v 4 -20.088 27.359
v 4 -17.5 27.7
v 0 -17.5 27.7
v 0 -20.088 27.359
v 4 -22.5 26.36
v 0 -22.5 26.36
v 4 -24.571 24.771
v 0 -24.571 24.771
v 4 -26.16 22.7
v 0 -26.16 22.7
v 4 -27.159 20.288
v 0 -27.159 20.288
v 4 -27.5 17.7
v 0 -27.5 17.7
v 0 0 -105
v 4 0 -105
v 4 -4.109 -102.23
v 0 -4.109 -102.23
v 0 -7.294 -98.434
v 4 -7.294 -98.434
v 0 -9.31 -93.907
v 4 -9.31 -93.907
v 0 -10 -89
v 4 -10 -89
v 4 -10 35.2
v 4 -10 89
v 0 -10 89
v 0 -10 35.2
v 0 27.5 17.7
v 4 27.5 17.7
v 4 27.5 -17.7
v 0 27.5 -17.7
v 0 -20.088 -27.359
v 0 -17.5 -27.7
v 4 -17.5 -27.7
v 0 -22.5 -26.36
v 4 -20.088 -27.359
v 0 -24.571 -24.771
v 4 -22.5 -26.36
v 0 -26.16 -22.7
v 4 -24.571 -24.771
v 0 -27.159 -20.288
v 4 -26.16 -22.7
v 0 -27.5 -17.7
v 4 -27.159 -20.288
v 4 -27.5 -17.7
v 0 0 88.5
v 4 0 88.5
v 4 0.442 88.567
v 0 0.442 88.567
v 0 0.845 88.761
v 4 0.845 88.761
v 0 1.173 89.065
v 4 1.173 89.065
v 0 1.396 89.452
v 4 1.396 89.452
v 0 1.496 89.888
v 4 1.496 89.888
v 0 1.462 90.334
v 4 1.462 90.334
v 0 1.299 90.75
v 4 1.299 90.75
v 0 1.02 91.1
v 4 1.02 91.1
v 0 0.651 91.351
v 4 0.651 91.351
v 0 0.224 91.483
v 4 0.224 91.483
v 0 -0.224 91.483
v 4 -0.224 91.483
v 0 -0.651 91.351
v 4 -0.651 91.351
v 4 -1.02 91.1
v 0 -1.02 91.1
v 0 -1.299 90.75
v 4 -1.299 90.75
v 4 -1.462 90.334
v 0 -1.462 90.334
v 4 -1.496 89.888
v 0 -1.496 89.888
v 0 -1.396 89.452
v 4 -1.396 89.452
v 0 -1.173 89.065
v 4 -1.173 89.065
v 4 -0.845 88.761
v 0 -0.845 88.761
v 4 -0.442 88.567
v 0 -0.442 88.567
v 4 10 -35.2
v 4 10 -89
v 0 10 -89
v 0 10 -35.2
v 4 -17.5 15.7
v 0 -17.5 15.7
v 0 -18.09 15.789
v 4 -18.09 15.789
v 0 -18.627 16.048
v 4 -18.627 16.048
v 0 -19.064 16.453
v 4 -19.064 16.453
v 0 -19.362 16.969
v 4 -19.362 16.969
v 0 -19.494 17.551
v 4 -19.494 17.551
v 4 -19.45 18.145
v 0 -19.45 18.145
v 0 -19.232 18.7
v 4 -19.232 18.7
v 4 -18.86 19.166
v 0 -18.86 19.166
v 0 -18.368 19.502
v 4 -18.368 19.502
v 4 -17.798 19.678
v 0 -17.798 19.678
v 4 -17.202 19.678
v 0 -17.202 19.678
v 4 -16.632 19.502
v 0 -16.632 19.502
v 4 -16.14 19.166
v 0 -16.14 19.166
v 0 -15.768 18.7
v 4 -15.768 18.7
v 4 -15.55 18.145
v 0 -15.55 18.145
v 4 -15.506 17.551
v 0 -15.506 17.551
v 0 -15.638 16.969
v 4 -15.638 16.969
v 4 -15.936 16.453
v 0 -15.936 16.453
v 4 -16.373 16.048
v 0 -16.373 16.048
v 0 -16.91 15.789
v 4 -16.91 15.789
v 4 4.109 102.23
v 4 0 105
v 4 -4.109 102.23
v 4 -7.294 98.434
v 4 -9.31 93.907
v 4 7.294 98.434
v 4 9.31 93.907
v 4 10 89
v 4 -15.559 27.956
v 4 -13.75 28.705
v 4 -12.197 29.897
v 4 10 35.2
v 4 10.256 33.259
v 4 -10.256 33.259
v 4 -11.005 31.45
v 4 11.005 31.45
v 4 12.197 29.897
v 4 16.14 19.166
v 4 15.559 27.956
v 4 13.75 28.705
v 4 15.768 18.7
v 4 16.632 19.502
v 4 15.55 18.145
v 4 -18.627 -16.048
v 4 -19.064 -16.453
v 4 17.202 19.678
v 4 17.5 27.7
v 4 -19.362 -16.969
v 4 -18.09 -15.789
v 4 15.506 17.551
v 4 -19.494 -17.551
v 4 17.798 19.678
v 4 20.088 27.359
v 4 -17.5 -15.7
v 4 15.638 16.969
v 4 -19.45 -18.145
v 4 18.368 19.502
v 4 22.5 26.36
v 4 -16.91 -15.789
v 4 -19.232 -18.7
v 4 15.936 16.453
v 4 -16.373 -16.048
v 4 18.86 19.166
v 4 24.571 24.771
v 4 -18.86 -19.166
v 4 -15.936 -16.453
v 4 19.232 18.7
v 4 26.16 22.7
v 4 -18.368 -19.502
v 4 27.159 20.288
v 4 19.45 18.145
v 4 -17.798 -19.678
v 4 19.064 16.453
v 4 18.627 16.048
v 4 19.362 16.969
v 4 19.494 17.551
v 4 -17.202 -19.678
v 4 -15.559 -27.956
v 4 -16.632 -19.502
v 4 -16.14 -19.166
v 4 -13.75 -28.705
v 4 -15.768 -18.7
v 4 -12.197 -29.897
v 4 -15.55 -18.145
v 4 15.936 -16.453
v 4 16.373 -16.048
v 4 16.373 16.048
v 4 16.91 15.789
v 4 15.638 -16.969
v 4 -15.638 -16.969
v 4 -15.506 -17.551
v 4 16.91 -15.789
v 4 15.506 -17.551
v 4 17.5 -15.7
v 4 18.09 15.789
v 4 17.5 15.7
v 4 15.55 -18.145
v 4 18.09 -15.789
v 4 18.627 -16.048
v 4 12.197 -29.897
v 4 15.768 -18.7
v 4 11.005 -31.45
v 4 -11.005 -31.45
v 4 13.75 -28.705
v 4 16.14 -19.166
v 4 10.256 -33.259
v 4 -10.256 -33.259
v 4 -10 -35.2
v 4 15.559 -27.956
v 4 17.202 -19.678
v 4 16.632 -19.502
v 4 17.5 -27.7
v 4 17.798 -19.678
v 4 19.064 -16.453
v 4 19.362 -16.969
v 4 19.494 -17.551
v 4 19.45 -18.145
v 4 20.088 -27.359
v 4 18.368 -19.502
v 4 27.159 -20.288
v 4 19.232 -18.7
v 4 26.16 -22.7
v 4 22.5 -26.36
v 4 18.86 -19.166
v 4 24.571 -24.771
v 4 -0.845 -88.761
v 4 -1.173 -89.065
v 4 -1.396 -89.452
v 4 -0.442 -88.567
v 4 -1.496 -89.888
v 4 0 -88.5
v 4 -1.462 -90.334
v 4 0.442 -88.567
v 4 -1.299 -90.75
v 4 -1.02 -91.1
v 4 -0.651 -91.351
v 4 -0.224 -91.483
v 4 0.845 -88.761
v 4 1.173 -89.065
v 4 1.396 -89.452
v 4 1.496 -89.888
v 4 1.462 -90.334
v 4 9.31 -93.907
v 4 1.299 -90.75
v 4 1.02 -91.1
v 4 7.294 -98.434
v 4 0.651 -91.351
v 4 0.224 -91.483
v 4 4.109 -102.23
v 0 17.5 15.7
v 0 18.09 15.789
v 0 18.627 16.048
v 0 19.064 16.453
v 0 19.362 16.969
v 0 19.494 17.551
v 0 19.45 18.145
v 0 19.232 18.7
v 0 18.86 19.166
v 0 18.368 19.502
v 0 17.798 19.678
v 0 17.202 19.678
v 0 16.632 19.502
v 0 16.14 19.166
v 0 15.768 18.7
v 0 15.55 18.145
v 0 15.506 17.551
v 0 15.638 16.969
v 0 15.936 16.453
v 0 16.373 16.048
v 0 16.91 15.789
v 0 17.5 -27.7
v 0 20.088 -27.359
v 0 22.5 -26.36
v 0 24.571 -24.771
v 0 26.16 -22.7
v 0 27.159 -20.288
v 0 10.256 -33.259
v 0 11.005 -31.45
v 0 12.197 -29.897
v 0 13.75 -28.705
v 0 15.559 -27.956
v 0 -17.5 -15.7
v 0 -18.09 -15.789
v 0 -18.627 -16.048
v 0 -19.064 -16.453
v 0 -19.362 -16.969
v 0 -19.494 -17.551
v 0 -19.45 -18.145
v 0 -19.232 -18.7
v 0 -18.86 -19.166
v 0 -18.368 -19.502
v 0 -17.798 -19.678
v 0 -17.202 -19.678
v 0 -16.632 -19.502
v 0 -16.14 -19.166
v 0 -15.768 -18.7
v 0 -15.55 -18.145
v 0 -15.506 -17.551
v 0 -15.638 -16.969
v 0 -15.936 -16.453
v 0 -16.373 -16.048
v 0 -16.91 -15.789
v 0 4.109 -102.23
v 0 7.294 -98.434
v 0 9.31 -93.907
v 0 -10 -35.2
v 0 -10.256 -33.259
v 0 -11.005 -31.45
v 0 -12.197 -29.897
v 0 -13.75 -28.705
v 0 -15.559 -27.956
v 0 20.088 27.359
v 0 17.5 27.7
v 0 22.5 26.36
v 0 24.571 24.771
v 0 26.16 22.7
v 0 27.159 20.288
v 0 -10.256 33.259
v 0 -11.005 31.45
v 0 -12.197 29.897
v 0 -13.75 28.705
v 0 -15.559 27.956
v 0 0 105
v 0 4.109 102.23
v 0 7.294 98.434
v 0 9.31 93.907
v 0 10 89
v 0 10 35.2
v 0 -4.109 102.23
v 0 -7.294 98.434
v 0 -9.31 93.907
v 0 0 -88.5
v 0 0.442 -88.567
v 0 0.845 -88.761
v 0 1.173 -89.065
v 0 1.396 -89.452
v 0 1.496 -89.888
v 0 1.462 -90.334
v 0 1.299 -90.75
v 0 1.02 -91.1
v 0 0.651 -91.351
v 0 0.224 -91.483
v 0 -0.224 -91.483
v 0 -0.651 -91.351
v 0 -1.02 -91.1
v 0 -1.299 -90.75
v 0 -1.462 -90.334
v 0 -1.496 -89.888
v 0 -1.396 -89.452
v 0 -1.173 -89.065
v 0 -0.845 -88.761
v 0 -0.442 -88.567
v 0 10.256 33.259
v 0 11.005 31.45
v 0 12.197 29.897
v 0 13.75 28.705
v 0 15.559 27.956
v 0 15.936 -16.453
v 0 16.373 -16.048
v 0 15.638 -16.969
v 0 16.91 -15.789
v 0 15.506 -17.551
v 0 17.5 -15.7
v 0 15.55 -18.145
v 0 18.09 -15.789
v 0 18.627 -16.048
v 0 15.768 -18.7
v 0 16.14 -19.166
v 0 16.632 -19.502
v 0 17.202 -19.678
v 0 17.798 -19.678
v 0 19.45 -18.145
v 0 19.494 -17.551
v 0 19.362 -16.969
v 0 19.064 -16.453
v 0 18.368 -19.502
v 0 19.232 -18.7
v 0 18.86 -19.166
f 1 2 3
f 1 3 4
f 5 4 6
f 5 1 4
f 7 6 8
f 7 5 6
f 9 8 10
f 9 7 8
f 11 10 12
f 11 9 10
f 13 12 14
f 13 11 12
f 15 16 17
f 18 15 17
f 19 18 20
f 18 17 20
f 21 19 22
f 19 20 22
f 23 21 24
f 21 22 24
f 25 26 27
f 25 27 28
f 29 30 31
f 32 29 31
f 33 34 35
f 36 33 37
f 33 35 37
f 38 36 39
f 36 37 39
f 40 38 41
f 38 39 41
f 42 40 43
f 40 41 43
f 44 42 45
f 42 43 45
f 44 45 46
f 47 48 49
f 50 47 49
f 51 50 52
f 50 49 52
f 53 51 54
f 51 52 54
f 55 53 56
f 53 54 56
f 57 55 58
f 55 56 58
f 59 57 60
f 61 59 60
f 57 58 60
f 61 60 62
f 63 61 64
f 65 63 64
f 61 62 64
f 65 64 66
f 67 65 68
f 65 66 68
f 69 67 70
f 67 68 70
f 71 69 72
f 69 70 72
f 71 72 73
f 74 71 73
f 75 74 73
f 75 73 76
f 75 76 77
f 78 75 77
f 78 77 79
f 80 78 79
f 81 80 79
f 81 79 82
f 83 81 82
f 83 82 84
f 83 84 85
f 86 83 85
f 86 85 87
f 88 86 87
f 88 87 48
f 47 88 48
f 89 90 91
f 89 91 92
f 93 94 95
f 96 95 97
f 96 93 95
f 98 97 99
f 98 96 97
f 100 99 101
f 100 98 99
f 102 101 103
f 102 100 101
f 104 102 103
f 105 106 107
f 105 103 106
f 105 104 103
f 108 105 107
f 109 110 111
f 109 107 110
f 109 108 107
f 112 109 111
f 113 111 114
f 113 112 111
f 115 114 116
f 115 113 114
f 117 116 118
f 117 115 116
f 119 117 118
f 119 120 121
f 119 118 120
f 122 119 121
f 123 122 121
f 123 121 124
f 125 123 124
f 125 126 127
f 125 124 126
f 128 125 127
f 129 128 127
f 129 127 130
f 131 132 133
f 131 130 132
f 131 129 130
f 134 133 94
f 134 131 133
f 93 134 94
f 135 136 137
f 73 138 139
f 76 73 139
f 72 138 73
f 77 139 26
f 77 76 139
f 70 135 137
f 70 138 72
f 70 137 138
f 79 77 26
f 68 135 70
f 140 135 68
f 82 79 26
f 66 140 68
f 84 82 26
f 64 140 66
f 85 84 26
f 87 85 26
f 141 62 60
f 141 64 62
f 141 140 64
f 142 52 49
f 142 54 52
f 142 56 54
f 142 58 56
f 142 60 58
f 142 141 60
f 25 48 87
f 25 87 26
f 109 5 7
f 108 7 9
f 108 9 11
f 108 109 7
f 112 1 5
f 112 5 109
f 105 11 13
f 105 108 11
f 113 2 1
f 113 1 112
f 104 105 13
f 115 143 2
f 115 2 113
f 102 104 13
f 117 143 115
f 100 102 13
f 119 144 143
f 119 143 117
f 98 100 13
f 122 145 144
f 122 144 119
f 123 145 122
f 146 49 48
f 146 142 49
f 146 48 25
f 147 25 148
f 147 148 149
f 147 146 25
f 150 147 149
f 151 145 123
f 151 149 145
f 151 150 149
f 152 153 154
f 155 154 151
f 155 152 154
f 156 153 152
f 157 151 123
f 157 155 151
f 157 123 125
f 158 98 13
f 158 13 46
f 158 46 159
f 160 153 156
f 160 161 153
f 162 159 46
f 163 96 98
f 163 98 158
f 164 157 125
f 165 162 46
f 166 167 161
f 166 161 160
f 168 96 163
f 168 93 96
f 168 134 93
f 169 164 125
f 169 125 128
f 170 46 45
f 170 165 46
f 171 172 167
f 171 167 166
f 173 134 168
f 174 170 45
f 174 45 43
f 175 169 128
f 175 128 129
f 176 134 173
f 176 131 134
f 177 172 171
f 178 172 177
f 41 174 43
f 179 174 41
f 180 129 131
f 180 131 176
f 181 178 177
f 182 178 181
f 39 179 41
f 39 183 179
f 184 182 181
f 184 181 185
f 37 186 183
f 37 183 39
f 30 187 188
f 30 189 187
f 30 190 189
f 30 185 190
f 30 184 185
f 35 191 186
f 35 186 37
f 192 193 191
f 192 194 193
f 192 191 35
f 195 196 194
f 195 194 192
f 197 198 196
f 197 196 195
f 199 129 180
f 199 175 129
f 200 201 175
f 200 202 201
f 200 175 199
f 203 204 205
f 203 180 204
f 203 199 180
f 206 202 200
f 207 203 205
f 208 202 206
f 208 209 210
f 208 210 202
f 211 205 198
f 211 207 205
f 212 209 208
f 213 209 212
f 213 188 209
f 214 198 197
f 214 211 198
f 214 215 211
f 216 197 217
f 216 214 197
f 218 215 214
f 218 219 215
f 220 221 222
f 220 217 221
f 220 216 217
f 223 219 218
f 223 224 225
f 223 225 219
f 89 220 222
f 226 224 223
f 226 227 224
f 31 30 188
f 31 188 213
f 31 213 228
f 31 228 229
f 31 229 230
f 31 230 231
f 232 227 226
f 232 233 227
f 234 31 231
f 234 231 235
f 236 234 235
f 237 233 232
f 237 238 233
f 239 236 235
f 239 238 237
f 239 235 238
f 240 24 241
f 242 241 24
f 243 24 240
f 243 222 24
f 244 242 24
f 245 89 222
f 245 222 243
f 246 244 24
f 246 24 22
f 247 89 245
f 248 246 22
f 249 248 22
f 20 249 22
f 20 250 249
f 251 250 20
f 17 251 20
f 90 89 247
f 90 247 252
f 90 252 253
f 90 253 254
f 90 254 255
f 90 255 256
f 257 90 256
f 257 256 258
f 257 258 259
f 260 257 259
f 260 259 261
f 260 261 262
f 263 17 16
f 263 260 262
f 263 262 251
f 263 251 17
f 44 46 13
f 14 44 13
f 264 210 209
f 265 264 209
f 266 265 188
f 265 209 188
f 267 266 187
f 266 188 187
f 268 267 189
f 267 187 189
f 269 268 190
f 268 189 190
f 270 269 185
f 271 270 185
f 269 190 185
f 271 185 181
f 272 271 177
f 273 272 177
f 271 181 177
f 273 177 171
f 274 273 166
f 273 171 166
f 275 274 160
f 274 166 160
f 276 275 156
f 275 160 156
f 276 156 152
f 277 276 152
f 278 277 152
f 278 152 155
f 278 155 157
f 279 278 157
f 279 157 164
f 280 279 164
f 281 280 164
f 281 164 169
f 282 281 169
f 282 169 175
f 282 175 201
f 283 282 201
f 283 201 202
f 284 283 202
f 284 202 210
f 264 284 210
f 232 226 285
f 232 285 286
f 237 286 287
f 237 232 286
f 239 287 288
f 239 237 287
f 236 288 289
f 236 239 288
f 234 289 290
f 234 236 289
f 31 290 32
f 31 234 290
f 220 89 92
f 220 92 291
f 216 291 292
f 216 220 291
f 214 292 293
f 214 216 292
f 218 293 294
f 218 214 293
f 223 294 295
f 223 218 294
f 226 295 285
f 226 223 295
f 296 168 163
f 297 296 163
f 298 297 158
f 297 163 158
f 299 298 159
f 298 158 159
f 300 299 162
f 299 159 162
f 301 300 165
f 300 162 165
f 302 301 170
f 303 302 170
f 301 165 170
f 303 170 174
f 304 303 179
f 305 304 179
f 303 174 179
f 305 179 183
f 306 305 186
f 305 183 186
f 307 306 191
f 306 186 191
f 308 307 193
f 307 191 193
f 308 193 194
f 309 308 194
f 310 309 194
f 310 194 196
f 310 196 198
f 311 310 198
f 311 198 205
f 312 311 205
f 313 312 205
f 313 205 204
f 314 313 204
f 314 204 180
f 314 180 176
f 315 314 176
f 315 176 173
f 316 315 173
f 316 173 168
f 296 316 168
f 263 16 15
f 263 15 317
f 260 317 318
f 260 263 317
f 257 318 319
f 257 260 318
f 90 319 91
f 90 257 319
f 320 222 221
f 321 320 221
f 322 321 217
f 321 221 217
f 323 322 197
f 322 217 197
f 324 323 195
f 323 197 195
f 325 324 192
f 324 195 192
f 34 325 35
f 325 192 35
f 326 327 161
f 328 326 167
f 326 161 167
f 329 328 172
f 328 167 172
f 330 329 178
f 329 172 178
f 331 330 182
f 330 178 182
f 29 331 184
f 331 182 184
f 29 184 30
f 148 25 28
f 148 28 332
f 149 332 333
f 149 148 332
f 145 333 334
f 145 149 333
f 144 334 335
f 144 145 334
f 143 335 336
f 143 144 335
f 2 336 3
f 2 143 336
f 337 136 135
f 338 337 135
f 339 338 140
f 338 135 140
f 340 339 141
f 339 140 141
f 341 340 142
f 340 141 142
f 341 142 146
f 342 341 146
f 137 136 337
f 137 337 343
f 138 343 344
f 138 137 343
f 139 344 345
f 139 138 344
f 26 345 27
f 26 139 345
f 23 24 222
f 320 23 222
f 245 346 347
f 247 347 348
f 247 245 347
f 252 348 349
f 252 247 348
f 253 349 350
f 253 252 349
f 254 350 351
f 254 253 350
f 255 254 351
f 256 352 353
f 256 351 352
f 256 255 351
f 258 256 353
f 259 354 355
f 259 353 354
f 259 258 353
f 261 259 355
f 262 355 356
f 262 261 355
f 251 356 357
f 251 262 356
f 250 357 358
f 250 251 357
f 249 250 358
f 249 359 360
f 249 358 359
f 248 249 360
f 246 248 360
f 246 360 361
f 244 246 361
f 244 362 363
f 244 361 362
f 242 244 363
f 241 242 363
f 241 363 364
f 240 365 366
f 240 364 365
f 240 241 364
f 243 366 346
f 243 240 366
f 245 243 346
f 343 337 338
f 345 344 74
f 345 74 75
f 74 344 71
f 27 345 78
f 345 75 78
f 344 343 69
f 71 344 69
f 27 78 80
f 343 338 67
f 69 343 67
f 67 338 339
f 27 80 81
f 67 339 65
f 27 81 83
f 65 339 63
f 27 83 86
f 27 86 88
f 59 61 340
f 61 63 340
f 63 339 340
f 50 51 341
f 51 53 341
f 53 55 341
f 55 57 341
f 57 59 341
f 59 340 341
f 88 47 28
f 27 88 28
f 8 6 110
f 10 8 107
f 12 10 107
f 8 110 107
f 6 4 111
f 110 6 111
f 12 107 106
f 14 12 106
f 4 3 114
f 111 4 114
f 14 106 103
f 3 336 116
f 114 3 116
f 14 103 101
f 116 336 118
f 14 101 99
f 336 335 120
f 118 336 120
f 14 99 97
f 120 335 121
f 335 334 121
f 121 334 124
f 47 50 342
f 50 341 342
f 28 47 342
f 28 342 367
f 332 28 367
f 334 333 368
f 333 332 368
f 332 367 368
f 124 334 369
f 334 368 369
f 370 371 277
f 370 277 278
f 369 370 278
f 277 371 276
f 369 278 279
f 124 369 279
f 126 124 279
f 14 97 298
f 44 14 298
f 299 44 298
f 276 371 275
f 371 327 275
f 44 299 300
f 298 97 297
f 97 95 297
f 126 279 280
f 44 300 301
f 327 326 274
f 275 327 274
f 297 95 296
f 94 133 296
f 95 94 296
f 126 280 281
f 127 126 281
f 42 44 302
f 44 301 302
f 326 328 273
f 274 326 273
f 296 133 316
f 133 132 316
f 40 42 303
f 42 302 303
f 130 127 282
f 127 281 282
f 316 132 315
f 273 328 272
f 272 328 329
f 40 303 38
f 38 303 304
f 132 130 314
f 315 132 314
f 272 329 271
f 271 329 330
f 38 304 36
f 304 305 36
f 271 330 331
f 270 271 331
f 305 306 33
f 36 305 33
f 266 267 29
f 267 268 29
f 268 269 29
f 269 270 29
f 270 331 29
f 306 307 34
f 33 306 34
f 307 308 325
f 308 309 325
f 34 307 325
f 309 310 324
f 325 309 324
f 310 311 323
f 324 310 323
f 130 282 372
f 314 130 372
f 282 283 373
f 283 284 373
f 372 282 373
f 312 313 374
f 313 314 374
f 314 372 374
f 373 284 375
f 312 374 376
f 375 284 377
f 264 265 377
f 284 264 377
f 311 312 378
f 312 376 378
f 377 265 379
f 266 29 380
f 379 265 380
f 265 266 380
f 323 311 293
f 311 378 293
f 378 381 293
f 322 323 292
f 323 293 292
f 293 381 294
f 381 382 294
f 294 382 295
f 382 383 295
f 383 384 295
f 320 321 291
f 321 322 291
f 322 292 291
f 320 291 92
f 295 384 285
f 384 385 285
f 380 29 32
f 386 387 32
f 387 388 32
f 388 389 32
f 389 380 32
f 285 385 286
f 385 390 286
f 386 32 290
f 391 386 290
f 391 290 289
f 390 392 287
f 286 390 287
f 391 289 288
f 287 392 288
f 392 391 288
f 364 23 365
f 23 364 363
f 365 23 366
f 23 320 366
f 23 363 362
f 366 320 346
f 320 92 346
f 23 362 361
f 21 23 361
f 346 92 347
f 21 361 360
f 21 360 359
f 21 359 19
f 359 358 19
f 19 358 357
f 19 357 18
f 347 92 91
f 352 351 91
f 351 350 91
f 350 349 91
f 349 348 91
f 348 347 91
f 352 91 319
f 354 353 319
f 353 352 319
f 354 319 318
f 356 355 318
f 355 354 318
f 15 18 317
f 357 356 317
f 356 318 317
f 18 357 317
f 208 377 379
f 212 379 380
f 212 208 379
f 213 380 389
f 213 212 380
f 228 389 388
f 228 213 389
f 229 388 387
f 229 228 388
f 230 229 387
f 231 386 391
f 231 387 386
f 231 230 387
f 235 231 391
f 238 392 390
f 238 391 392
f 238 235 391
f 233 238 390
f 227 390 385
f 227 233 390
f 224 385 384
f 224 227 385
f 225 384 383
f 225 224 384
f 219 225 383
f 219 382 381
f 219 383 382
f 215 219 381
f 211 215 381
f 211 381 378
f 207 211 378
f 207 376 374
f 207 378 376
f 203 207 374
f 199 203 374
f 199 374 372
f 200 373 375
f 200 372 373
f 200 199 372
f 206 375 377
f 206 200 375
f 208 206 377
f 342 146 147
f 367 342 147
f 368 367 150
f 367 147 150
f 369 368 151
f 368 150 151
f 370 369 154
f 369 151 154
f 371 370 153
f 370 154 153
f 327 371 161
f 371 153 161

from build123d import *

# Parameters (mm, degrees)
SKETCH1_W               = 210
SKETCH1_H               = 61.270358306
BOSS_EXTRUDE1_DEPTH     = 4
SKETCH2_R               = 1.5
CUT_EXTRUDE1_DEPTH      = 5
SKETCH3_R               = 2
CUT_EXTRUDE2_DEPTH      = 5
CUT_EXTRUDE3_DEPTH      = 5
MIRROR3_COPY_1_SKETCH_R = 2
MIRROR3_COPY_1_DEPTH    = 5
MIRROR3_COPY_2_DEPTH    = 5


with BuildPart() as part:
    # Sketch1 → Boss-Extrude1 (new body)
    with BuildSketch(Plane(origin=(0, 0, 0), x_dir=(0, 0, -1), z_dir=(1, 0, 0))):
        Rectangle(SKETCH1_W, SKETCH1_H)
    extrude(amount=BOSS_EXTRUDE1_DEPTH)

    # Sketch2 → Cut-Extrude1 (cut, through all)
    with BuildSketch(Plane(origin=(4, 0, 0), x_dir=(0, 0, -1), z_dir=(1, 0, 0))):
        with Locations((-90, 0)):
            Circle(SKETCH2_R)
    cut_extrude1 = extrude(amount=-CUT_EXTRUDE1_DEPTH, mode=Mode.SUBTRACT)

    # Sketch3 → Cut-Extrude2 (cut, through all)
    with BuildSketch(Plane(origin=(4, 0, 0), x_dir=(0, 0, -1), z_dir=(1, 0, 0))):
        with Locations((-17.7, 17.5)):
            Circle(SKETCH3_R)
    cut_extrude2 = extrude(amount=-CUT_EXTRUDE2_DEPTH, mode=Mode.SUBTRACT)

    # Sketch4 → Cut-Extrude3 (cut, through all)
    with BuildSketch(Plane(origin=(4, 0, 0), x_dir=(0, 0, -1), z_dir=(1, 0, 0))):
        with BuildLine():
            Line((-89, 10), (-35.2, 10))
            ThreePointArc((-35.2, 10), (-29.896699141, 12.196699141), (-27.7, 17.5))
            ThreePointArc((-27.7, 17.5), (-24.771067812, 24.571067812), (-17.7, 27.5))
            Line((-17.7, 27.5), (0, 27.5))
            Line((0, 27.5), (0, 30.635179153))
            Line((0, 30.635179153), (-105, 30.635179153))
            Line((-105, 30.635179153), (-105, 0))
            ThreePointArc((-105, 0), (-98.433981132, 7.294369811), (-89, 10))
        make_face()
    cut_extrude3 = extrude(amount=-CUT_EXTRUDE3_DEPTH, mode=Mode.SUBTRACT)

    # Mirror2: Cut-Extrude2, Cut-Extrude3 across plane
    add(cut_extrude2.mirror(Plane.ZX), mode=Mode.SUBTRACT)
    add(cut_extrude3.mirror(Plane.ZX), mode=Mode.SUBTRACT)

    # Mirror3: Cut-Extrude3, Cut-Extrude1, Cut-Extrude2 across plane
    add(cut_extrude3.mirror(Plane.XY), mode=Mode.SUBTRACT)
    add(cut_extrude1.mirror(Plane.XY), mode=Mode.SUBTRACT)
    add(cut_extrude2.mirror(Plane.XY), mode=Mode.SUBTRACT)

    # Mirror3 copy 1 sketch → Mirror3 copy 1 (cut, through all)
    with BuildSketch(Plane(origin=(4, 0, 0), x_dir=(0, 0, 1), z_dir=(1, 0, 0))):
        with Locations((-17.7, 17.5)):
            Circle(MIRROR3_COPY_1_SKETCH_R)
    extrude(amount=-MIRROR3_COPY_1_DEPTH, mode=Mode.SUBTRACT)

    # Mirror3 copy 2 sketch → Mirror3 copy 2 (cut, through all)
    with BuildSketch(Plane(origin=(4, 0, 0), x_dir=(0, 0, 1), z_dir=(1, 0, 0))):
        with BuildLine():
            Line((-89, 10), (-35.2, 10))
            ThreePointArc((-35.2, 10), (-29.896699141, 12.196699141), (-27.7, 17.5))
            ThreePointArc((-27.7, 17.5), (-24.771067812, 24.571067812), (-17.7, 27.5))
            Line((-17.7, 27.5), (0, 27.5))
            Line((0, 27.5), (0, 30.635179153))
            Line((0, 30.635179153), (-105, 30.635179153))
            Line((-105, 30.635179153), (-105, 0))
            ThreePointArc((-105, 0), (-98.433981132, 7.294369811), (-89, 10))
        make_face()
    extrude(amount=-MIRROR3_COPY_2_DEPTH, mode=Mode.SUBTRACT)


solid = part.part
